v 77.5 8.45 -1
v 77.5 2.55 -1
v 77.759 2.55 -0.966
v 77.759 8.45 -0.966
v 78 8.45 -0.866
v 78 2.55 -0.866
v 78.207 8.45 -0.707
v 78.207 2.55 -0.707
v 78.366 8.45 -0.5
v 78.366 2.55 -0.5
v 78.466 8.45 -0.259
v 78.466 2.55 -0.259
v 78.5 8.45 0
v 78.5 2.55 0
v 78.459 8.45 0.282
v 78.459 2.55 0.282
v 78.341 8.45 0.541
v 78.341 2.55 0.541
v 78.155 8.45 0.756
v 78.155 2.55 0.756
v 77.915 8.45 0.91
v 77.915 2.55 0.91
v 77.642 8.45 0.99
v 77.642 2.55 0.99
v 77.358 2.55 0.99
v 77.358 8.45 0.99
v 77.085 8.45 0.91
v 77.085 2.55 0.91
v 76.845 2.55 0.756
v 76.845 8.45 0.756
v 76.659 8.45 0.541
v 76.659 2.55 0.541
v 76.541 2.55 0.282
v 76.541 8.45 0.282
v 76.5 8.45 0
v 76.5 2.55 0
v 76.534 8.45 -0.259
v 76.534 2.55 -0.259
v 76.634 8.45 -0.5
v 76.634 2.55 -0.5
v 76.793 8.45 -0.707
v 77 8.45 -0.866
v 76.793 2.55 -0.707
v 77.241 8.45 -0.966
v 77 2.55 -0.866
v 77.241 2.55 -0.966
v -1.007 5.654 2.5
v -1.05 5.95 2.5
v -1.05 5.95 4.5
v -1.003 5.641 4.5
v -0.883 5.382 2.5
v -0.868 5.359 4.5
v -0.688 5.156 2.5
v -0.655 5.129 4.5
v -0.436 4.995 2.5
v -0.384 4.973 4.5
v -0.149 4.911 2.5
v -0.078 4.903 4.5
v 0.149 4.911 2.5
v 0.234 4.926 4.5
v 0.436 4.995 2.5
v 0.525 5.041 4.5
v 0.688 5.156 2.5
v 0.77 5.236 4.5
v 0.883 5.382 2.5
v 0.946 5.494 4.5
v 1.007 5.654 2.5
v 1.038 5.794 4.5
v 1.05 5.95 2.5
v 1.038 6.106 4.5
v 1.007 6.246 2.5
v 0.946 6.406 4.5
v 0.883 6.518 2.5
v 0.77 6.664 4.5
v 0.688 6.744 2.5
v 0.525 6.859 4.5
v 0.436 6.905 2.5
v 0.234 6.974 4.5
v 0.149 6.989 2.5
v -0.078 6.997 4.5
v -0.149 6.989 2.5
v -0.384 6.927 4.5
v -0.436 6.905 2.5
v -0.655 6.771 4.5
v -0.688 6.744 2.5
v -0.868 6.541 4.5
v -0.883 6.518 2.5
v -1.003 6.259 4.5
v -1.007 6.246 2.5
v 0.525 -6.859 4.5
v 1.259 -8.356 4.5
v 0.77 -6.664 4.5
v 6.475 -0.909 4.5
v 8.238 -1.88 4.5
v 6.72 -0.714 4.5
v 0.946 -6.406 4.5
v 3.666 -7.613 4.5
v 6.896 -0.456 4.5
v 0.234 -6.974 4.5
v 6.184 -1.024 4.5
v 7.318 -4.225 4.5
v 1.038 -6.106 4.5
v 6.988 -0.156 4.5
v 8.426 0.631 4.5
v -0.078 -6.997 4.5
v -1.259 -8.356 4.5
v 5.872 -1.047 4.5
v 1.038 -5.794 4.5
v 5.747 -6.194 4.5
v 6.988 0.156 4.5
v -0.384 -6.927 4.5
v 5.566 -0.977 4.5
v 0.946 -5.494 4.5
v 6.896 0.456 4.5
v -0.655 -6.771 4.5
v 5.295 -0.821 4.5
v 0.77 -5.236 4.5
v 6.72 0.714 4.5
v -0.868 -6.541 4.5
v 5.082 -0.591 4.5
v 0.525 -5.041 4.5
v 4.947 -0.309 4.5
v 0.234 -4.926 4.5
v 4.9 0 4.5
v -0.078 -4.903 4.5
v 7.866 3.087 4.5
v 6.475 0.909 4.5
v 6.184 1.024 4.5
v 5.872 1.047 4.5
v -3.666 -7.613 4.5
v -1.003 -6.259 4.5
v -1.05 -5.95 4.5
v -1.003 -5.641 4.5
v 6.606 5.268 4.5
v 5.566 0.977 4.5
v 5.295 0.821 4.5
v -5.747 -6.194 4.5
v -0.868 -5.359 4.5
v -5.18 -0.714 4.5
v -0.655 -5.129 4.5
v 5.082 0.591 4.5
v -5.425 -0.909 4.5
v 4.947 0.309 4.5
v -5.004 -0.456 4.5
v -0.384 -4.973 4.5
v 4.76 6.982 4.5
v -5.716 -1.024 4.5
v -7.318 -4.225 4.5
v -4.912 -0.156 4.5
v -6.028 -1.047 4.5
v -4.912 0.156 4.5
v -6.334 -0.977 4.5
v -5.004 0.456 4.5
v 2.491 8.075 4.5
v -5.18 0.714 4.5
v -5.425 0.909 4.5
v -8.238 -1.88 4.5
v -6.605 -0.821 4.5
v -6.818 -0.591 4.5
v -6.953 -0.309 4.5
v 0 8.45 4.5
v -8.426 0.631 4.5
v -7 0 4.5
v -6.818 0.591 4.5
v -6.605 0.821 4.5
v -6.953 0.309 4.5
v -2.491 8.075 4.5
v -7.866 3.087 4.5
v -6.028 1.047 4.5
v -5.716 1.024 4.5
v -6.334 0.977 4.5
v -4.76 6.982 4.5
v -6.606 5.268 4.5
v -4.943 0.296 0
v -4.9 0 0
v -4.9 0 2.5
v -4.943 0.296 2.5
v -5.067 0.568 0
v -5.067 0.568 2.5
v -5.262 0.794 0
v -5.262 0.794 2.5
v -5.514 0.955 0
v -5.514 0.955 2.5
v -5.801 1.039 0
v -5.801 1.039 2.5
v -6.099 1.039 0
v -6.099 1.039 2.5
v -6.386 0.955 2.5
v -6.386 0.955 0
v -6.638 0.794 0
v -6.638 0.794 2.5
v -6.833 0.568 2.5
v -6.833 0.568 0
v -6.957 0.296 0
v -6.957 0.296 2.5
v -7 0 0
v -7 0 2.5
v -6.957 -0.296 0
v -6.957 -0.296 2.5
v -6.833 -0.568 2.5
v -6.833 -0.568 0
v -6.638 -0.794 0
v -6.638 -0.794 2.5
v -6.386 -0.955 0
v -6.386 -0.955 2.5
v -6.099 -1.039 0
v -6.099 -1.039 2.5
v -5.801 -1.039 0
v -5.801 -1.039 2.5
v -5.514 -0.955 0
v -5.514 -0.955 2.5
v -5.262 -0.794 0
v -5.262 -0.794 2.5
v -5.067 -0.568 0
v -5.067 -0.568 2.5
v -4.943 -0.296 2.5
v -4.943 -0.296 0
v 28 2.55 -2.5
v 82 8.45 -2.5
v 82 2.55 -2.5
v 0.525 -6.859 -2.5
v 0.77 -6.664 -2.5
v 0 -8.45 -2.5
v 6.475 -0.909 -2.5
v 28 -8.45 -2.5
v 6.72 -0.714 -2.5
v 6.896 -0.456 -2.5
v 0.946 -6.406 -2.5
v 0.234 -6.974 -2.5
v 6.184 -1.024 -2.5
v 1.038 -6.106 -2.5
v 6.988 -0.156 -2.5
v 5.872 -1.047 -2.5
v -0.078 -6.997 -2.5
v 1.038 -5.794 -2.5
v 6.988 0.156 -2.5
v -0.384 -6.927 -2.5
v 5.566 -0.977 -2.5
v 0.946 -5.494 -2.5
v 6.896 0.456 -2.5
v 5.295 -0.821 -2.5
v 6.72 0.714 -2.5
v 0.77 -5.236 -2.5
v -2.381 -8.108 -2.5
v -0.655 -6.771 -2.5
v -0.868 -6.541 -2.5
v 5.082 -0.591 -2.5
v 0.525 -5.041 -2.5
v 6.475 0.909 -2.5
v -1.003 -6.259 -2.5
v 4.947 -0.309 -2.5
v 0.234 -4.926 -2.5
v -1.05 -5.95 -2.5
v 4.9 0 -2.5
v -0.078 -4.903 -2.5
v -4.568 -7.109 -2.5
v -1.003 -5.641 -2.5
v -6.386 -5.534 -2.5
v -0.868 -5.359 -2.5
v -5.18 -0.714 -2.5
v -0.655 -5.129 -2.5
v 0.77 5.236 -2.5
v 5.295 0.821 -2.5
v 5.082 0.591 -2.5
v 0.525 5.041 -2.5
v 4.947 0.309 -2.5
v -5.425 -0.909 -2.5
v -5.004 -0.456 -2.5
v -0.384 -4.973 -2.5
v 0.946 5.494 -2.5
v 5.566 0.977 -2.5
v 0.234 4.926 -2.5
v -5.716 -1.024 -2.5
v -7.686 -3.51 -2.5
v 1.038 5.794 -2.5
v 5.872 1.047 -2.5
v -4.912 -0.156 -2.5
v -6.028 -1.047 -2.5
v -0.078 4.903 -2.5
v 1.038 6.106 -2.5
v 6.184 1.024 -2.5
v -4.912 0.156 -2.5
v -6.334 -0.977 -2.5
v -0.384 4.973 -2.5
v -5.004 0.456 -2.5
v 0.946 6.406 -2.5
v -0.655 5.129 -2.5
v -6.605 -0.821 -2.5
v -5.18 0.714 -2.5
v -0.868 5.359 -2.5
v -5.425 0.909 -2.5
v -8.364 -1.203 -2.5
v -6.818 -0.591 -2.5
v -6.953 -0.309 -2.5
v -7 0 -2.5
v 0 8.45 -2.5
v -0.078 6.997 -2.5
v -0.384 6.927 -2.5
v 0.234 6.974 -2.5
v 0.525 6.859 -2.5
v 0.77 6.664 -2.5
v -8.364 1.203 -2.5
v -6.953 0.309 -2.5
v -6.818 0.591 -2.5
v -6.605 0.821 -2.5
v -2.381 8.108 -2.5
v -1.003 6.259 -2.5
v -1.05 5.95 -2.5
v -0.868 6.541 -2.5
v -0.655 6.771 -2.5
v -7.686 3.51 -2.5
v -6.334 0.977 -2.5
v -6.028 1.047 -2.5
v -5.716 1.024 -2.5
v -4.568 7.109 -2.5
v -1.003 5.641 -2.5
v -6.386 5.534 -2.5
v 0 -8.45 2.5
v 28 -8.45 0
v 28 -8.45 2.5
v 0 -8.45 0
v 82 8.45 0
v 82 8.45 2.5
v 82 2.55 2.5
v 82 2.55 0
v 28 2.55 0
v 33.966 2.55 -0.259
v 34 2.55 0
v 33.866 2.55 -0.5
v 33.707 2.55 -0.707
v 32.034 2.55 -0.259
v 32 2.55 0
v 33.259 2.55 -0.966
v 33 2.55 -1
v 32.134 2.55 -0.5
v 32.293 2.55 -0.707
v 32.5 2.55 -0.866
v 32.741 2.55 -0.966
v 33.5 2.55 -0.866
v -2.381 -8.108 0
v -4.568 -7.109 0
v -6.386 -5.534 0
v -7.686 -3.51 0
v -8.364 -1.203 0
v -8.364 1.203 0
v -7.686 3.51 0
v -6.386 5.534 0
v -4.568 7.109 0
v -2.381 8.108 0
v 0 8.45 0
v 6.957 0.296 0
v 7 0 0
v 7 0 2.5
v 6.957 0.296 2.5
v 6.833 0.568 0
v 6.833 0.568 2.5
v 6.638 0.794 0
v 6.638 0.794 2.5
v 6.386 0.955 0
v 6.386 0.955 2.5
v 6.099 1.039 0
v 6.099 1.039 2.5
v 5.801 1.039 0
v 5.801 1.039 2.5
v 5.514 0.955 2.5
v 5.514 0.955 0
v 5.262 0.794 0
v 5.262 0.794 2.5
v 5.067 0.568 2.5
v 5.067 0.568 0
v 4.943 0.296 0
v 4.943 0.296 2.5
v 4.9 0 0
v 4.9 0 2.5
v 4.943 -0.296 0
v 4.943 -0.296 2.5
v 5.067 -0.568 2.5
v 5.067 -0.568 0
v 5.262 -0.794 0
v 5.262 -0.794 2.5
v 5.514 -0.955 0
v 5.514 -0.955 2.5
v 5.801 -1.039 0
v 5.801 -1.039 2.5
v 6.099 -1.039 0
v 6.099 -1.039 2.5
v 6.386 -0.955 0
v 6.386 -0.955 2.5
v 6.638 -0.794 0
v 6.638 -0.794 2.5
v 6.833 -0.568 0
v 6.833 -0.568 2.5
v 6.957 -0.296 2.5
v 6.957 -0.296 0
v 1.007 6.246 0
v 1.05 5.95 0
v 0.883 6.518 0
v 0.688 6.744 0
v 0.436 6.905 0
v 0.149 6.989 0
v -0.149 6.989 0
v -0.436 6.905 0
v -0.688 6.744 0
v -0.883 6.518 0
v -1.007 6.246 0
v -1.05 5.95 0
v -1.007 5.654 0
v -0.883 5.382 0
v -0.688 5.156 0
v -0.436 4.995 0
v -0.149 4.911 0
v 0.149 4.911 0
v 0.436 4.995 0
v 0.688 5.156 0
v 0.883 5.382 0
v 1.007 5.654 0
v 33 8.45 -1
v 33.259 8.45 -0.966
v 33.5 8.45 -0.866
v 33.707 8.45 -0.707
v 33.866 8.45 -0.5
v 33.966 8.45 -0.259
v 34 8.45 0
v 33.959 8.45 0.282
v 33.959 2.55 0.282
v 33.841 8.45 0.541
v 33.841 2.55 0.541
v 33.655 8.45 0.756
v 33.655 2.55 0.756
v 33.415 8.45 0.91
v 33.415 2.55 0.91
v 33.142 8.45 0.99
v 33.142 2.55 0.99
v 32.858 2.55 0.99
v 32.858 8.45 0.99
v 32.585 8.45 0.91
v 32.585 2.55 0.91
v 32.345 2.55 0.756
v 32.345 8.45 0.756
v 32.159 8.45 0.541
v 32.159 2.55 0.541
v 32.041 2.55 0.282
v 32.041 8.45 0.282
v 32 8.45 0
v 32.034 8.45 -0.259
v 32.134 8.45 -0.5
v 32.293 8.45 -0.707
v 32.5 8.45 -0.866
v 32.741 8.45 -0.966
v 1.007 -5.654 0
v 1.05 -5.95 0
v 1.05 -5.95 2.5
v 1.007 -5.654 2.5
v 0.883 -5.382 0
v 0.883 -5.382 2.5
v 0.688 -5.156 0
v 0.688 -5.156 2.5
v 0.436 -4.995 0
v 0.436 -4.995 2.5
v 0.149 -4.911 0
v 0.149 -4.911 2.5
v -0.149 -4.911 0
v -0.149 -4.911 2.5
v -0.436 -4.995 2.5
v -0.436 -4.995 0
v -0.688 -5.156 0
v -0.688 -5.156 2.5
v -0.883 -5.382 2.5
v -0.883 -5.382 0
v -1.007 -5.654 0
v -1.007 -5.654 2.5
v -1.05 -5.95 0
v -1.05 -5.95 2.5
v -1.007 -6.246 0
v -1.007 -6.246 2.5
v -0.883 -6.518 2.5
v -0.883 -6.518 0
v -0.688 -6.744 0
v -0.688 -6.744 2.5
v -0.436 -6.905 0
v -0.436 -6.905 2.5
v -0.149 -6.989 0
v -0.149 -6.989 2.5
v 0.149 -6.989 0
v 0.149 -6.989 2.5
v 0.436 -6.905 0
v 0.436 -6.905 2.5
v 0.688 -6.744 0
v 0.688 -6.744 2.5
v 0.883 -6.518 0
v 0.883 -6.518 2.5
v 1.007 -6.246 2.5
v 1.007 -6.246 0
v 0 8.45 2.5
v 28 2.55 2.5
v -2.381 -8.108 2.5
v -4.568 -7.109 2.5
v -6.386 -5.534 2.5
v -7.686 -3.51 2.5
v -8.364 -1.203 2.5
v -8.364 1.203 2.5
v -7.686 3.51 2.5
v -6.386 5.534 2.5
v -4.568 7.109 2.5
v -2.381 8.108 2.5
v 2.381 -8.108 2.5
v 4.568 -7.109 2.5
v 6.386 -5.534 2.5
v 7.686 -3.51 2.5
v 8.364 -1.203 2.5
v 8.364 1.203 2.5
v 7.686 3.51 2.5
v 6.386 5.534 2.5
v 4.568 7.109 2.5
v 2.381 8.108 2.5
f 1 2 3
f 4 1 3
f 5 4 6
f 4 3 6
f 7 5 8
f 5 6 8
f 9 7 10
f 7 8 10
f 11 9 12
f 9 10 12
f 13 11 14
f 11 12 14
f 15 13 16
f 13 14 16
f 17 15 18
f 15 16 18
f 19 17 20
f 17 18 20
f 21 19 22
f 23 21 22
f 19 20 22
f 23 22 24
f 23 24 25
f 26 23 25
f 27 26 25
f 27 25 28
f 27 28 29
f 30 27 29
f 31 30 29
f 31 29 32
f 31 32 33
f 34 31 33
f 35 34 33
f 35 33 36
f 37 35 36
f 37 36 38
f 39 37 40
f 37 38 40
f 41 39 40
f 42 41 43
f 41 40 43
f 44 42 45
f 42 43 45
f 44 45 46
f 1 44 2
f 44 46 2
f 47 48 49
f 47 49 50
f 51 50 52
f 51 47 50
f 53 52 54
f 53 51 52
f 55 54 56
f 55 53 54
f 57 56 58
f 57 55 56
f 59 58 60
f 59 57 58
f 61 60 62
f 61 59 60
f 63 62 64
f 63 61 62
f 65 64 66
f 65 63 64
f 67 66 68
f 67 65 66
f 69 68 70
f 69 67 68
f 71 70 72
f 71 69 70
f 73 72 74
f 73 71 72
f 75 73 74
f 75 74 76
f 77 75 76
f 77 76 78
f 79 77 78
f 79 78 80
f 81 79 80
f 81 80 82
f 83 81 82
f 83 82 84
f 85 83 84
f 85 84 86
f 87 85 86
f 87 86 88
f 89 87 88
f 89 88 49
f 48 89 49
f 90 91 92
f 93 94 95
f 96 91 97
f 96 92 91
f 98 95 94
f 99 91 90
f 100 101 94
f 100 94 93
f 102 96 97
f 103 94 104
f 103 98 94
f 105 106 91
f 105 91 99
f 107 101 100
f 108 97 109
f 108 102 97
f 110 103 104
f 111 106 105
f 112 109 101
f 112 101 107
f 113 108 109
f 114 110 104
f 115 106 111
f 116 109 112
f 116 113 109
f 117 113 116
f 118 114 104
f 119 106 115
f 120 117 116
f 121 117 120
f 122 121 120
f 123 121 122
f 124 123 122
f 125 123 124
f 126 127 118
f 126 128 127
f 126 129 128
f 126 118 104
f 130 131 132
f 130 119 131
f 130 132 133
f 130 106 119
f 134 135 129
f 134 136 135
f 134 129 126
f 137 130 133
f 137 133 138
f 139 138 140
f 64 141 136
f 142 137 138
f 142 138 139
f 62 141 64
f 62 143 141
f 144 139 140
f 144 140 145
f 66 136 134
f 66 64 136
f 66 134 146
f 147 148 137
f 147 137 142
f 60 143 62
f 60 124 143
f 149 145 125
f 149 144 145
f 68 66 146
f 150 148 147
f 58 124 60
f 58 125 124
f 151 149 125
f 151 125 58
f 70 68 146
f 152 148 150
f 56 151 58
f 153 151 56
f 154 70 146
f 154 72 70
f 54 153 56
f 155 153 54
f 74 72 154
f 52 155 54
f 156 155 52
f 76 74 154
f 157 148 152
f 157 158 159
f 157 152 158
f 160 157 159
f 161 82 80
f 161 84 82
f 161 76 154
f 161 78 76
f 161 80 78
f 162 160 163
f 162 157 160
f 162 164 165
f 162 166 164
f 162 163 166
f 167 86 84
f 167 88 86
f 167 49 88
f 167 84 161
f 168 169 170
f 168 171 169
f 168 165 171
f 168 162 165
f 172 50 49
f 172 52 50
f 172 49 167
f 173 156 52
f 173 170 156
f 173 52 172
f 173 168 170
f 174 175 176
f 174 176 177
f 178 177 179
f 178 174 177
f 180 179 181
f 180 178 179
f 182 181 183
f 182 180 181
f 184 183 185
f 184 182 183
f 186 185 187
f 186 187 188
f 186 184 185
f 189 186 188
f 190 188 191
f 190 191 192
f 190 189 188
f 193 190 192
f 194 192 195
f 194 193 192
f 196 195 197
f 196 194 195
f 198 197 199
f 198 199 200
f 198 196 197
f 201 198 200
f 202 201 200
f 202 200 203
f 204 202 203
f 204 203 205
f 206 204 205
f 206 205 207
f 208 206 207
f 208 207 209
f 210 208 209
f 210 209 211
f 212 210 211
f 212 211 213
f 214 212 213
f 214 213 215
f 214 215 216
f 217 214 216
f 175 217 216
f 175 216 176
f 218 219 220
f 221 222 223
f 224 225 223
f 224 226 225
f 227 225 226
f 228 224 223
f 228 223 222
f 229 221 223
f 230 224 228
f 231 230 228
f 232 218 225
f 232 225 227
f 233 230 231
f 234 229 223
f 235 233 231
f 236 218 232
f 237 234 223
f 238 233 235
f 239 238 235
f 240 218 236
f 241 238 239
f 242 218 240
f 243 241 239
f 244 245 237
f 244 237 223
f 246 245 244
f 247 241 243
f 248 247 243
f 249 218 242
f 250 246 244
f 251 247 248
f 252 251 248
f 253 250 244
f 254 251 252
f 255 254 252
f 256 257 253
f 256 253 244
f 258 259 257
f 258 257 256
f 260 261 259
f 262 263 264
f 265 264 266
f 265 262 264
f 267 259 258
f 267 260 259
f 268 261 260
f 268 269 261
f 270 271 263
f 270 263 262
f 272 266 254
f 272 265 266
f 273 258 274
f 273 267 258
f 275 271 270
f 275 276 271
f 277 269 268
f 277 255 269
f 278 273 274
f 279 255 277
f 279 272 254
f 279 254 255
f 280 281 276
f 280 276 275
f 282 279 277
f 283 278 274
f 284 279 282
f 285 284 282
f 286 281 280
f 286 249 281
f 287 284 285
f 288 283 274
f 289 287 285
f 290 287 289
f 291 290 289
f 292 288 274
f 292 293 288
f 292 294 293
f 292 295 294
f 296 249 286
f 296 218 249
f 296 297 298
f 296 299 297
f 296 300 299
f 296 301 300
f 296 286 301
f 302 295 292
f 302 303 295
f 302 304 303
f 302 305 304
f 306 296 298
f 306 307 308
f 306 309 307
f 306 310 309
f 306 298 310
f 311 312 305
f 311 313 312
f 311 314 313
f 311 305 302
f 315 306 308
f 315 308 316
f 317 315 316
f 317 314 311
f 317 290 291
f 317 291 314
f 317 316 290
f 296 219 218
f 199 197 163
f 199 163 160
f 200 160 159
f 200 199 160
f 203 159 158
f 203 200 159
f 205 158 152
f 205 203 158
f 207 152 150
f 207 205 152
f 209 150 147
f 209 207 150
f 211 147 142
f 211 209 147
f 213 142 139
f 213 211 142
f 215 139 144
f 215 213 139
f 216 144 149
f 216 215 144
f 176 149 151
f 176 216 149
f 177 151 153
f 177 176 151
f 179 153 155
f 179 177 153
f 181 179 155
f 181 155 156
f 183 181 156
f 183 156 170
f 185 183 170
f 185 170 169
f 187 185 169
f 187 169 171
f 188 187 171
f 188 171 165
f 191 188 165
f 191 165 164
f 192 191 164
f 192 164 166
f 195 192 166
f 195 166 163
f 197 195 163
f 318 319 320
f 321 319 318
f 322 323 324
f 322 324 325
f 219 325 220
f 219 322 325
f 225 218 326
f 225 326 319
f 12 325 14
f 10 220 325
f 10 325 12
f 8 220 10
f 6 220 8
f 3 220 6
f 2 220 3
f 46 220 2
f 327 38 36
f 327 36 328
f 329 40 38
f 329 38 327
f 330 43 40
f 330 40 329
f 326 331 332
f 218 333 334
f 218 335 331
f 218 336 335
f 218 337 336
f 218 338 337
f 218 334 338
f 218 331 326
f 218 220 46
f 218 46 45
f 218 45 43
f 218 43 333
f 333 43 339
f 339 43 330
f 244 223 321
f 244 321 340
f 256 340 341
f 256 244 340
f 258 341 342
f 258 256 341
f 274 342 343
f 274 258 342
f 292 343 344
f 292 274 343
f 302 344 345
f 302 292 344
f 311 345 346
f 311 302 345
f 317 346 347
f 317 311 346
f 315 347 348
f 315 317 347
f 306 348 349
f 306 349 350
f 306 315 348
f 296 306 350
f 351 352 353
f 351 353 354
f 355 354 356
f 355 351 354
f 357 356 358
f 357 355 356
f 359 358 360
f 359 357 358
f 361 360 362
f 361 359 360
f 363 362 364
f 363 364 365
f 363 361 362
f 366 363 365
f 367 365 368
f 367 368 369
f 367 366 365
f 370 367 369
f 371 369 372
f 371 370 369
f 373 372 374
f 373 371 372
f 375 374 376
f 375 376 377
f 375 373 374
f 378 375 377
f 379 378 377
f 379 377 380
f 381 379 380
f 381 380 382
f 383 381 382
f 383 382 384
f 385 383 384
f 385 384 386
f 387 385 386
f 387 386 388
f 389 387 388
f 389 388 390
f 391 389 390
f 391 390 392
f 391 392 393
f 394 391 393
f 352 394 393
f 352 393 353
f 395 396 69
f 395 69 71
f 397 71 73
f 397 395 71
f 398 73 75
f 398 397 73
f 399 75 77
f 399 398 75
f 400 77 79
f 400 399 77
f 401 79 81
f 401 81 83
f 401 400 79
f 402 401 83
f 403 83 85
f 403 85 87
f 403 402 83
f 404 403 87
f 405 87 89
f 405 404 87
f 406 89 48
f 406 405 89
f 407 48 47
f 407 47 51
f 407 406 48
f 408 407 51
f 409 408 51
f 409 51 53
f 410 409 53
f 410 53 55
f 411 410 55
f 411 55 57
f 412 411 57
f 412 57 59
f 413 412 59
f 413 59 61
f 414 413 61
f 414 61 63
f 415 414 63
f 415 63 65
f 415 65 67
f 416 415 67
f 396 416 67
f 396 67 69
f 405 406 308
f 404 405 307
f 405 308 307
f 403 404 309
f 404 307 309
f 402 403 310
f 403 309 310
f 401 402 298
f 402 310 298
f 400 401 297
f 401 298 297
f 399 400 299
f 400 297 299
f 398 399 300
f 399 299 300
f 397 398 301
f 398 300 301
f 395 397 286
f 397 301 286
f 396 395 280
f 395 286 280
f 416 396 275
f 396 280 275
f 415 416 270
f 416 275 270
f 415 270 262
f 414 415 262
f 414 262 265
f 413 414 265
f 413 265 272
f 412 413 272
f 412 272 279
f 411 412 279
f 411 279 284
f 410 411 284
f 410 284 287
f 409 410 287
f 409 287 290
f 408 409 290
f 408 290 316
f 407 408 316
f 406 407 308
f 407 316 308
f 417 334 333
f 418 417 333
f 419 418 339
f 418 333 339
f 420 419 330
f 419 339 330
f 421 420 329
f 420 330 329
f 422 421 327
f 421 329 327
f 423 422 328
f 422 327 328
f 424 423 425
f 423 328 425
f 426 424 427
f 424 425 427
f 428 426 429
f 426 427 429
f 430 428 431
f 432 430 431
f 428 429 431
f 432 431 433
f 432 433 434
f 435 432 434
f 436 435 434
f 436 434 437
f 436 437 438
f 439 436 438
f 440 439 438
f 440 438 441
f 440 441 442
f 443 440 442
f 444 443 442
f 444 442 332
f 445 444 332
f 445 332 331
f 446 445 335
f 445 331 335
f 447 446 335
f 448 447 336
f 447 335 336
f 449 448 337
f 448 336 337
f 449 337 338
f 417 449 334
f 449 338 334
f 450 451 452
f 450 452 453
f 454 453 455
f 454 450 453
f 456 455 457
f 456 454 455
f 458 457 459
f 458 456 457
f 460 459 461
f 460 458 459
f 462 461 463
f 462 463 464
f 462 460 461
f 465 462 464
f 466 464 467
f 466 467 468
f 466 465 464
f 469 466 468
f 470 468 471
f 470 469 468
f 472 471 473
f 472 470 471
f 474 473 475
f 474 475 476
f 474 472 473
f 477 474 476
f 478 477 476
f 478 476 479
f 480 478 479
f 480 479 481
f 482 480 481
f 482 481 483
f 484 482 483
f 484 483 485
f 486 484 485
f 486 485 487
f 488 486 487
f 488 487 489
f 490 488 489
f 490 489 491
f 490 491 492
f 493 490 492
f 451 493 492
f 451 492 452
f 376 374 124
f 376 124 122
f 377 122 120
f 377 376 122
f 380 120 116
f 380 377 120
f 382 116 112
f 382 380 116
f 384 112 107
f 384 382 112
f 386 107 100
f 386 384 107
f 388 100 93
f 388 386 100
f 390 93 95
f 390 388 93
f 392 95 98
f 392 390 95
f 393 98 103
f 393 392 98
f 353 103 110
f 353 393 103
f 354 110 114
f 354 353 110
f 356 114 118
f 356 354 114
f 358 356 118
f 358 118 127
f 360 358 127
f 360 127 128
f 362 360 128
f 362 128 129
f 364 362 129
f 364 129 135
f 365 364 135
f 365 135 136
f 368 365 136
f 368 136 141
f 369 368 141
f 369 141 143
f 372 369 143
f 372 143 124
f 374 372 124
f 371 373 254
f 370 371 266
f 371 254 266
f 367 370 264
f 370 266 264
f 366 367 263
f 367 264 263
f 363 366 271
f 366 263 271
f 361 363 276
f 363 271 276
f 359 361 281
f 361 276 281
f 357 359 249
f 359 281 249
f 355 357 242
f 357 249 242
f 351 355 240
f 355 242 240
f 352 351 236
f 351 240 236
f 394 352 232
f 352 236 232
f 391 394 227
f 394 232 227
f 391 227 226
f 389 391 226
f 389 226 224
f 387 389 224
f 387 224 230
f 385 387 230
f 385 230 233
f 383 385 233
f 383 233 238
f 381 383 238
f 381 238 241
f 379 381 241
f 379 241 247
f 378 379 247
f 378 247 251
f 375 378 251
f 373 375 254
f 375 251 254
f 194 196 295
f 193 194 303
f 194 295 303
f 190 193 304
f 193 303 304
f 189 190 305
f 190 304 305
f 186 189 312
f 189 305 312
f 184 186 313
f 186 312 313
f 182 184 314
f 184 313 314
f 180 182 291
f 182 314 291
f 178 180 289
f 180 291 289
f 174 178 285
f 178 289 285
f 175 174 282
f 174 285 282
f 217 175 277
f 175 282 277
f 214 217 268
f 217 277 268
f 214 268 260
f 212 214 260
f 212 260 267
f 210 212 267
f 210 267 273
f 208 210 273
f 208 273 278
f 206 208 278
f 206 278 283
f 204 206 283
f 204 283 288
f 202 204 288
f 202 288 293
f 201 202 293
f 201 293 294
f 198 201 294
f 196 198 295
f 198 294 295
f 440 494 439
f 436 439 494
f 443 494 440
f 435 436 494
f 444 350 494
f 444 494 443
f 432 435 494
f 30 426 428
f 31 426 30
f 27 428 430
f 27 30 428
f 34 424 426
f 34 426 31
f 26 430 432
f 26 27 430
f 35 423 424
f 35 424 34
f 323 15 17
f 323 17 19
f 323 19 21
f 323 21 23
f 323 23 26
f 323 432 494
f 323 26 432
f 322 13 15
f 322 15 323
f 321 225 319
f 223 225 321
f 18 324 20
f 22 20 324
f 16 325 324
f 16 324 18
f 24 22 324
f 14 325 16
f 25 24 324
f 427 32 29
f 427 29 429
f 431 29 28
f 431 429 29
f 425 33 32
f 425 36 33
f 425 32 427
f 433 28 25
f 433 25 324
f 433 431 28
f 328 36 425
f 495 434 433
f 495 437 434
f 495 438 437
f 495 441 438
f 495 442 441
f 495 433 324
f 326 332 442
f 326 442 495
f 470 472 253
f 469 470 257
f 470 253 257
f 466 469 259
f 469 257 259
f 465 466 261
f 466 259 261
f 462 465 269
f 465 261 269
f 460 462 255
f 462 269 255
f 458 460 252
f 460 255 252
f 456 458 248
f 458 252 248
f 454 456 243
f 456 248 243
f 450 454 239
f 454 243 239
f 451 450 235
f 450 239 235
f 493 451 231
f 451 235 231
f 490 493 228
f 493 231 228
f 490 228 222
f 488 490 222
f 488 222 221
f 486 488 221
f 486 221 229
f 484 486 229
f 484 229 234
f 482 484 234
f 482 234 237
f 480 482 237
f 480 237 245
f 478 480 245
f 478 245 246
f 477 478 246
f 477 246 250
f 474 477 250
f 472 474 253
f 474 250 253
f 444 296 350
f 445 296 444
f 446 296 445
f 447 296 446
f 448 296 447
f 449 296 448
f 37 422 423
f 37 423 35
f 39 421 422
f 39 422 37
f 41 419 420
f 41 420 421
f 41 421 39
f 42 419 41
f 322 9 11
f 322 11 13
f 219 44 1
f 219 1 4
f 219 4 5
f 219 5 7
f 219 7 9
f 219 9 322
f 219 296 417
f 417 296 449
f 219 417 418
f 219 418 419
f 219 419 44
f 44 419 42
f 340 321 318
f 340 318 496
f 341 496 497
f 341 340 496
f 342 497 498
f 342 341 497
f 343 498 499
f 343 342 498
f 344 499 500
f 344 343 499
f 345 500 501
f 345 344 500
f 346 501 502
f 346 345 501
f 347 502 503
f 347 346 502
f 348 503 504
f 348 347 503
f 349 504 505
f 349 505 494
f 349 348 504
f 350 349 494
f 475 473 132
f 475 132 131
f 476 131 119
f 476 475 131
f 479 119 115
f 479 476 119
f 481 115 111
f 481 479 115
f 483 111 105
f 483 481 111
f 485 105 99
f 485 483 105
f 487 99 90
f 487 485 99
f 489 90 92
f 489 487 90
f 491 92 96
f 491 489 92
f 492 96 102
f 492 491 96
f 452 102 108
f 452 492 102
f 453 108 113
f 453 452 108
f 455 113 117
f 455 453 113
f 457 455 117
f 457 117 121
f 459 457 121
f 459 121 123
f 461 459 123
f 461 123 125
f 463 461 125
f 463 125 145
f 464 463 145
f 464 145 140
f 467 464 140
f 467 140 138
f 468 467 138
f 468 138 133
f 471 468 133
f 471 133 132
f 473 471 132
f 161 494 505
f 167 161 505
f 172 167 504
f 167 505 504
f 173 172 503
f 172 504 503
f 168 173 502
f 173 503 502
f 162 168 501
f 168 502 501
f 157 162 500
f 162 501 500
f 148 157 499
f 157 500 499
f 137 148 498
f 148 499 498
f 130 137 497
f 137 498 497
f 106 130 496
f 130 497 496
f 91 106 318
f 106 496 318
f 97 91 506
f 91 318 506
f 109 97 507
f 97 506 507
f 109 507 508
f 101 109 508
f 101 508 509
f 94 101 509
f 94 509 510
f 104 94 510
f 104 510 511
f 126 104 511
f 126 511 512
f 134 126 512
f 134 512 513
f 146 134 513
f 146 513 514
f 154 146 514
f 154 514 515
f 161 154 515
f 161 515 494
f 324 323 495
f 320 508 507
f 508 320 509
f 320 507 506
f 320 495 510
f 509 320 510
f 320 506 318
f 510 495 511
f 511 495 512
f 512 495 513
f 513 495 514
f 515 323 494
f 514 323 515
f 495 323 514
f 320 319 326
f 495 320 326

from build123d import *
from build123d.topology import SkipClean

# Parameters (mm, degrees)
SKETCH_1_R          = 1.05
EXTRUDE_1_DEPTH     = 2.5
SKETCH_2_W          = 82
SKETCH_2_H          = 7
CUT_EXTRUDE_1_DEPTH = 2.5
SKETCH_3_W          = 79
SKETCH_3_H          = 4
EXTRUDE_2_DEPTH     = 10.7
SKETCH_4_W          = 0.401921616
SKETCH_4_H          = 13.2
EXTRUDE_3_DEPTH     = 0.6
SKETCH_5_W          = 6.198078384
SKETCH_5_H          = 0.4
EXTRUDE_4_DEPTH     = 0.4
SKETCH_6_W          = 79
SKETCH_6_H          = 6.717043916
CUT_EXTRUDE_2_DEPTH = 20
EXTRUDE_START       = 2.5
SKETCH_7_R          = 1.05
EXTRUDE_5_DEPTH     = 2.5
SKETCH_9_R          = 1
CUT_EXTRUDE_3_DEPTH = 10
SKETCH_10_R         = 1
CUT_EXTRUDE_4_DEPTH = 10
SKETCH_11_W         = 5
SKETCH_11_H         = 9.9
CUT_EXTRUDE_5_DEPTH = 28
SKETCH_13_R         = 8.45
SKETCH_13_R_2       = 1.05
EXTRUDE_7_DEPTH     = 2


with BuildPart() as part:
    # 스케치1 → 보스-돌출1 (new body)
    with BuildSketch(Plane.XY):
        with BuildLine():
            Line((0, 8.45), (110, 8.45))
            Line((110, 8.45), (110, -8.45))
            Line((110, -8.45), (0, -8.45))
            ThreePointArc((0, -8.45), (-8.45, 0), (0, 8.45))
        make_face()
        with Locations((-5.95, 0)):
            Circle(SKETCH_1_R, mode=Mode.SUBTRACT)
        with Locations((0, 5.95)):
            Circle(SKETCH_1_R, mode=Mode.SUBTRACT)
        with Locations((5.95, 0)):
            Circle(SKETCH_1_R, mode=Mode.SUBTRACT)
        with Locations((0, -5.95)):
            Circle(SKETCH_1_R, mode=Mode.SUBTRACT)
    extrude(amount=EXTRUDE_1_DEPTH)

    # 스케치2 → 컷-돌출1 (cut)
    with BuildSketch(Plane(origin=(0, 0, 0), x_dir=(-1, 0, 0), z_dir=(0, 0, -1))):
        with Locations((-69, -4.95)):
            Rectangle(SKETCH_2_W, SKETCH_2_H)
    extrude(amount=-CUT_EXTRUDE_1_DEPTH, mode=Mode.SUBTRACT)

    # 스케치3 → 보스-돌출2 (add)
    with BuildSketch(Plane(origin=(0, 0, 0), x_dir=(-1, 0, 0), z_dir=(0, 0, -1))):
        with Locations((-67.5, 0.55)):
            Rectangle(SKETCH_3_W, SKETCH_3_H)
    extrude(amount=EXTRUDE_2_DEPTH)

    # 스케치4 → 보스-돌출3 (add)
    with BuildSketch(Plane.XZ.offset(1.45)):
        with Locations((74.1, -4.1)):
            Rectangle(SKETCH_4_W, SKETCH_4_H)
        with Locations((67.5, -4.1)):
            Rectangle(SKETCH_4_W, SKETCH_4_H)
        with Locations((80.7, -4.1)):
            Rectangle(SKETCH_4_W, SKETCH_4_H)
        with Locations((87.3, -4.1)):
            Rectangle(SKETCH_4_W, SKETCH_4_H)
        with Locations((93.9, -4.1)):
            Rectangle(SKETCH_4_W, SKETCH_4_H)
    extrude(amount=EXTRUDE_3_DEPTH)

    # 스케치5 → 보스-돌출4 (add)
    with BuildSketch(Plane.XZ.offset(1.45)):
        with Locations((70.8, 0.95)):
            Rectangle(SKETCH_5_W, SKETCH_5_H)
        with Locations((70.8, -9.15)):
            Rectangle(SKETCH_5_W, SKETCH_5_H)
        with Locations((77.4, 0.95)):
            Rectangle(SKETCH_5_W, SKETCH_5_H)
        with Locations((77.4, -9.15)):
            Rectangle(SKETCH_5_W, SKETCH_5_H)
        with Locations((84, 0.95)):
            Rectangle(SKETCH_5_W, SKETCH_5_H)
        with Locations((84, -9.15)):
            Rectangle(SKETCH_5_W, SKETCH_5_H)
        with Locations((90.6, 0.95)):
            Rectangle(SKETCH_5_W, SKETCH_5_H)
        with Locations((90.6, -9.15)):
            Rectangle(SKETCH_5_W, SKETCH_5_H)
    extrude(amount=EXTRUDE_4_DEPTH)

    # 스케치6 → 컷-돌출2 (cut)
    with BuildSketch(Plane(origin=(0, 0, -10.7), x_dir=(-1, 0, 0), z_dir=(0, 0, -1))):
        with Locations((-67.5, -0.808521958)):
            Rectangle(SKETCH_6_W, SKETCH_6_H)
    extrude(amount=-CUT_EXTRUDE_2_DEPTH, mode=Mode.SUBTRACT)

    # 스케치7 → 보스-돌출5 (add)
    with SkipClean():  # the faces are left unmerged after this step: merging them gives an invalid solid
        with BuildSketch(Plane(origin=(0, 0, 0), x_dir=(-1, 0, 0), z_dir=(0, 0, -1)).offset(EXTRUDE_START)):
            with BuildLine():
                Line((-110, -1.45), (-107, -1.45))
                Line((-107, -1.45), (-107, 2.55))
                Line((-107, 2.55), (-28, 2.55))
                Line((-28, 2.55), (-28, -8.45))
                Line((-28, -8.45), (0, -8.45))
                ThreePointArc((0, -8.45), (8.402739403, -0.892451973), (1.774921032, 8.261486266))
                ThreePointArc((1.774921032, 8.261486266), (0.892451973, 8.402739403), (0, 8.45))
                Line((0, 8.45), (-110, 8.45))
                Line((-110, 8.45), (-110, -1.45))
            make_face()
            with Locations((0, -5.95)):
                Circle(SKETCH_7_R, mode=Mode.SUBTRACT)
            with Locations((-5.95, 0)):
                Circle(SKETCH_7_R, mode=Mode.SUBTRACT)
            with Locations((5.95, 0)):
                Circle(SKETCH_7_R, mode=Mode.SUBTRACT)
            with Locations((0, 5.95)):
                Circle(SKETCH_7_R, mode=Mode.SUBTRACT)
        extrude(amount=-EXTRUDE_5_DEPTH)

    # 스케치9 → 컷-돌출3 (cut)
    with SkipClean():  # the faces are left unmerged after this step: merging them gives an invalid solid
        with BuildSketch(Plane.XZ.offset(-2.55)):
            with Locations((102, 0)):
                Circle(SKETCH_9_R)
            with Locations((33, 0)):
                Circle(SKETCH_9_R)
        extrude(amount=-CUT_EXTRUDE_3_DEPTH, mode=Mode.SUBTRACT)

    # 스케치10 → 컷-돌출4 (cut)
    with SkipClean():  # the faces are left unmerged after this step: merging them gives an invalid solid
        with BuildSketch(Plane.XZ.offset(-2.55)):
            with Locations((77.5, 0)):
                Circle(SKETCH_10_R)
        extrude(amount=-CUT_EXTRUDE_4_DEPTH, mode=Mode.SUBTRACT)

    # 스케치11 → 컷-돌출5 (cut)
    with SkipClean():  # the faces are left unmerged after this step: merging them gives an invalid solid
        with BuildSketch(Plane(origin=(110, 0, 0), x_dir=(0, 0, -1), z_dir=(1, 0, 0))):
            with Locations((0, 3.5)):
                Rectangle(SKETCH_11_W, SKETCH_11_H)
        extrude(amount=-CUT_EXTRUDE_5_DEPTH, mode=Mode.SUBTRACT)

    # 스케치13 → 보스-돌출7 (add)
    with BuildSketch(Plane.XY.offset(2.5)):
        Circle(SKETCH_13_R)
        with Locations((0, -5.95)):
            Circle(SKETCH_13_R_2, mode=Mode.SUBTRACT)
        with Locations((5.95, 0)):
            Circle(SKETCH_13_R_2, mode=Mode.SUBTRACT)
        with Locations((0, 5.95)):
            Circle(SKETCH_13_R_2, mode=Mode.SUBTRACT)
        with Locations((-5.95, 0)):
            Circle(SKETCH_13_R_2, mode=Mode.SUBTRACT)
    extrude(amount=EXTRUDE_7_DEPTH)


solid = part.part
